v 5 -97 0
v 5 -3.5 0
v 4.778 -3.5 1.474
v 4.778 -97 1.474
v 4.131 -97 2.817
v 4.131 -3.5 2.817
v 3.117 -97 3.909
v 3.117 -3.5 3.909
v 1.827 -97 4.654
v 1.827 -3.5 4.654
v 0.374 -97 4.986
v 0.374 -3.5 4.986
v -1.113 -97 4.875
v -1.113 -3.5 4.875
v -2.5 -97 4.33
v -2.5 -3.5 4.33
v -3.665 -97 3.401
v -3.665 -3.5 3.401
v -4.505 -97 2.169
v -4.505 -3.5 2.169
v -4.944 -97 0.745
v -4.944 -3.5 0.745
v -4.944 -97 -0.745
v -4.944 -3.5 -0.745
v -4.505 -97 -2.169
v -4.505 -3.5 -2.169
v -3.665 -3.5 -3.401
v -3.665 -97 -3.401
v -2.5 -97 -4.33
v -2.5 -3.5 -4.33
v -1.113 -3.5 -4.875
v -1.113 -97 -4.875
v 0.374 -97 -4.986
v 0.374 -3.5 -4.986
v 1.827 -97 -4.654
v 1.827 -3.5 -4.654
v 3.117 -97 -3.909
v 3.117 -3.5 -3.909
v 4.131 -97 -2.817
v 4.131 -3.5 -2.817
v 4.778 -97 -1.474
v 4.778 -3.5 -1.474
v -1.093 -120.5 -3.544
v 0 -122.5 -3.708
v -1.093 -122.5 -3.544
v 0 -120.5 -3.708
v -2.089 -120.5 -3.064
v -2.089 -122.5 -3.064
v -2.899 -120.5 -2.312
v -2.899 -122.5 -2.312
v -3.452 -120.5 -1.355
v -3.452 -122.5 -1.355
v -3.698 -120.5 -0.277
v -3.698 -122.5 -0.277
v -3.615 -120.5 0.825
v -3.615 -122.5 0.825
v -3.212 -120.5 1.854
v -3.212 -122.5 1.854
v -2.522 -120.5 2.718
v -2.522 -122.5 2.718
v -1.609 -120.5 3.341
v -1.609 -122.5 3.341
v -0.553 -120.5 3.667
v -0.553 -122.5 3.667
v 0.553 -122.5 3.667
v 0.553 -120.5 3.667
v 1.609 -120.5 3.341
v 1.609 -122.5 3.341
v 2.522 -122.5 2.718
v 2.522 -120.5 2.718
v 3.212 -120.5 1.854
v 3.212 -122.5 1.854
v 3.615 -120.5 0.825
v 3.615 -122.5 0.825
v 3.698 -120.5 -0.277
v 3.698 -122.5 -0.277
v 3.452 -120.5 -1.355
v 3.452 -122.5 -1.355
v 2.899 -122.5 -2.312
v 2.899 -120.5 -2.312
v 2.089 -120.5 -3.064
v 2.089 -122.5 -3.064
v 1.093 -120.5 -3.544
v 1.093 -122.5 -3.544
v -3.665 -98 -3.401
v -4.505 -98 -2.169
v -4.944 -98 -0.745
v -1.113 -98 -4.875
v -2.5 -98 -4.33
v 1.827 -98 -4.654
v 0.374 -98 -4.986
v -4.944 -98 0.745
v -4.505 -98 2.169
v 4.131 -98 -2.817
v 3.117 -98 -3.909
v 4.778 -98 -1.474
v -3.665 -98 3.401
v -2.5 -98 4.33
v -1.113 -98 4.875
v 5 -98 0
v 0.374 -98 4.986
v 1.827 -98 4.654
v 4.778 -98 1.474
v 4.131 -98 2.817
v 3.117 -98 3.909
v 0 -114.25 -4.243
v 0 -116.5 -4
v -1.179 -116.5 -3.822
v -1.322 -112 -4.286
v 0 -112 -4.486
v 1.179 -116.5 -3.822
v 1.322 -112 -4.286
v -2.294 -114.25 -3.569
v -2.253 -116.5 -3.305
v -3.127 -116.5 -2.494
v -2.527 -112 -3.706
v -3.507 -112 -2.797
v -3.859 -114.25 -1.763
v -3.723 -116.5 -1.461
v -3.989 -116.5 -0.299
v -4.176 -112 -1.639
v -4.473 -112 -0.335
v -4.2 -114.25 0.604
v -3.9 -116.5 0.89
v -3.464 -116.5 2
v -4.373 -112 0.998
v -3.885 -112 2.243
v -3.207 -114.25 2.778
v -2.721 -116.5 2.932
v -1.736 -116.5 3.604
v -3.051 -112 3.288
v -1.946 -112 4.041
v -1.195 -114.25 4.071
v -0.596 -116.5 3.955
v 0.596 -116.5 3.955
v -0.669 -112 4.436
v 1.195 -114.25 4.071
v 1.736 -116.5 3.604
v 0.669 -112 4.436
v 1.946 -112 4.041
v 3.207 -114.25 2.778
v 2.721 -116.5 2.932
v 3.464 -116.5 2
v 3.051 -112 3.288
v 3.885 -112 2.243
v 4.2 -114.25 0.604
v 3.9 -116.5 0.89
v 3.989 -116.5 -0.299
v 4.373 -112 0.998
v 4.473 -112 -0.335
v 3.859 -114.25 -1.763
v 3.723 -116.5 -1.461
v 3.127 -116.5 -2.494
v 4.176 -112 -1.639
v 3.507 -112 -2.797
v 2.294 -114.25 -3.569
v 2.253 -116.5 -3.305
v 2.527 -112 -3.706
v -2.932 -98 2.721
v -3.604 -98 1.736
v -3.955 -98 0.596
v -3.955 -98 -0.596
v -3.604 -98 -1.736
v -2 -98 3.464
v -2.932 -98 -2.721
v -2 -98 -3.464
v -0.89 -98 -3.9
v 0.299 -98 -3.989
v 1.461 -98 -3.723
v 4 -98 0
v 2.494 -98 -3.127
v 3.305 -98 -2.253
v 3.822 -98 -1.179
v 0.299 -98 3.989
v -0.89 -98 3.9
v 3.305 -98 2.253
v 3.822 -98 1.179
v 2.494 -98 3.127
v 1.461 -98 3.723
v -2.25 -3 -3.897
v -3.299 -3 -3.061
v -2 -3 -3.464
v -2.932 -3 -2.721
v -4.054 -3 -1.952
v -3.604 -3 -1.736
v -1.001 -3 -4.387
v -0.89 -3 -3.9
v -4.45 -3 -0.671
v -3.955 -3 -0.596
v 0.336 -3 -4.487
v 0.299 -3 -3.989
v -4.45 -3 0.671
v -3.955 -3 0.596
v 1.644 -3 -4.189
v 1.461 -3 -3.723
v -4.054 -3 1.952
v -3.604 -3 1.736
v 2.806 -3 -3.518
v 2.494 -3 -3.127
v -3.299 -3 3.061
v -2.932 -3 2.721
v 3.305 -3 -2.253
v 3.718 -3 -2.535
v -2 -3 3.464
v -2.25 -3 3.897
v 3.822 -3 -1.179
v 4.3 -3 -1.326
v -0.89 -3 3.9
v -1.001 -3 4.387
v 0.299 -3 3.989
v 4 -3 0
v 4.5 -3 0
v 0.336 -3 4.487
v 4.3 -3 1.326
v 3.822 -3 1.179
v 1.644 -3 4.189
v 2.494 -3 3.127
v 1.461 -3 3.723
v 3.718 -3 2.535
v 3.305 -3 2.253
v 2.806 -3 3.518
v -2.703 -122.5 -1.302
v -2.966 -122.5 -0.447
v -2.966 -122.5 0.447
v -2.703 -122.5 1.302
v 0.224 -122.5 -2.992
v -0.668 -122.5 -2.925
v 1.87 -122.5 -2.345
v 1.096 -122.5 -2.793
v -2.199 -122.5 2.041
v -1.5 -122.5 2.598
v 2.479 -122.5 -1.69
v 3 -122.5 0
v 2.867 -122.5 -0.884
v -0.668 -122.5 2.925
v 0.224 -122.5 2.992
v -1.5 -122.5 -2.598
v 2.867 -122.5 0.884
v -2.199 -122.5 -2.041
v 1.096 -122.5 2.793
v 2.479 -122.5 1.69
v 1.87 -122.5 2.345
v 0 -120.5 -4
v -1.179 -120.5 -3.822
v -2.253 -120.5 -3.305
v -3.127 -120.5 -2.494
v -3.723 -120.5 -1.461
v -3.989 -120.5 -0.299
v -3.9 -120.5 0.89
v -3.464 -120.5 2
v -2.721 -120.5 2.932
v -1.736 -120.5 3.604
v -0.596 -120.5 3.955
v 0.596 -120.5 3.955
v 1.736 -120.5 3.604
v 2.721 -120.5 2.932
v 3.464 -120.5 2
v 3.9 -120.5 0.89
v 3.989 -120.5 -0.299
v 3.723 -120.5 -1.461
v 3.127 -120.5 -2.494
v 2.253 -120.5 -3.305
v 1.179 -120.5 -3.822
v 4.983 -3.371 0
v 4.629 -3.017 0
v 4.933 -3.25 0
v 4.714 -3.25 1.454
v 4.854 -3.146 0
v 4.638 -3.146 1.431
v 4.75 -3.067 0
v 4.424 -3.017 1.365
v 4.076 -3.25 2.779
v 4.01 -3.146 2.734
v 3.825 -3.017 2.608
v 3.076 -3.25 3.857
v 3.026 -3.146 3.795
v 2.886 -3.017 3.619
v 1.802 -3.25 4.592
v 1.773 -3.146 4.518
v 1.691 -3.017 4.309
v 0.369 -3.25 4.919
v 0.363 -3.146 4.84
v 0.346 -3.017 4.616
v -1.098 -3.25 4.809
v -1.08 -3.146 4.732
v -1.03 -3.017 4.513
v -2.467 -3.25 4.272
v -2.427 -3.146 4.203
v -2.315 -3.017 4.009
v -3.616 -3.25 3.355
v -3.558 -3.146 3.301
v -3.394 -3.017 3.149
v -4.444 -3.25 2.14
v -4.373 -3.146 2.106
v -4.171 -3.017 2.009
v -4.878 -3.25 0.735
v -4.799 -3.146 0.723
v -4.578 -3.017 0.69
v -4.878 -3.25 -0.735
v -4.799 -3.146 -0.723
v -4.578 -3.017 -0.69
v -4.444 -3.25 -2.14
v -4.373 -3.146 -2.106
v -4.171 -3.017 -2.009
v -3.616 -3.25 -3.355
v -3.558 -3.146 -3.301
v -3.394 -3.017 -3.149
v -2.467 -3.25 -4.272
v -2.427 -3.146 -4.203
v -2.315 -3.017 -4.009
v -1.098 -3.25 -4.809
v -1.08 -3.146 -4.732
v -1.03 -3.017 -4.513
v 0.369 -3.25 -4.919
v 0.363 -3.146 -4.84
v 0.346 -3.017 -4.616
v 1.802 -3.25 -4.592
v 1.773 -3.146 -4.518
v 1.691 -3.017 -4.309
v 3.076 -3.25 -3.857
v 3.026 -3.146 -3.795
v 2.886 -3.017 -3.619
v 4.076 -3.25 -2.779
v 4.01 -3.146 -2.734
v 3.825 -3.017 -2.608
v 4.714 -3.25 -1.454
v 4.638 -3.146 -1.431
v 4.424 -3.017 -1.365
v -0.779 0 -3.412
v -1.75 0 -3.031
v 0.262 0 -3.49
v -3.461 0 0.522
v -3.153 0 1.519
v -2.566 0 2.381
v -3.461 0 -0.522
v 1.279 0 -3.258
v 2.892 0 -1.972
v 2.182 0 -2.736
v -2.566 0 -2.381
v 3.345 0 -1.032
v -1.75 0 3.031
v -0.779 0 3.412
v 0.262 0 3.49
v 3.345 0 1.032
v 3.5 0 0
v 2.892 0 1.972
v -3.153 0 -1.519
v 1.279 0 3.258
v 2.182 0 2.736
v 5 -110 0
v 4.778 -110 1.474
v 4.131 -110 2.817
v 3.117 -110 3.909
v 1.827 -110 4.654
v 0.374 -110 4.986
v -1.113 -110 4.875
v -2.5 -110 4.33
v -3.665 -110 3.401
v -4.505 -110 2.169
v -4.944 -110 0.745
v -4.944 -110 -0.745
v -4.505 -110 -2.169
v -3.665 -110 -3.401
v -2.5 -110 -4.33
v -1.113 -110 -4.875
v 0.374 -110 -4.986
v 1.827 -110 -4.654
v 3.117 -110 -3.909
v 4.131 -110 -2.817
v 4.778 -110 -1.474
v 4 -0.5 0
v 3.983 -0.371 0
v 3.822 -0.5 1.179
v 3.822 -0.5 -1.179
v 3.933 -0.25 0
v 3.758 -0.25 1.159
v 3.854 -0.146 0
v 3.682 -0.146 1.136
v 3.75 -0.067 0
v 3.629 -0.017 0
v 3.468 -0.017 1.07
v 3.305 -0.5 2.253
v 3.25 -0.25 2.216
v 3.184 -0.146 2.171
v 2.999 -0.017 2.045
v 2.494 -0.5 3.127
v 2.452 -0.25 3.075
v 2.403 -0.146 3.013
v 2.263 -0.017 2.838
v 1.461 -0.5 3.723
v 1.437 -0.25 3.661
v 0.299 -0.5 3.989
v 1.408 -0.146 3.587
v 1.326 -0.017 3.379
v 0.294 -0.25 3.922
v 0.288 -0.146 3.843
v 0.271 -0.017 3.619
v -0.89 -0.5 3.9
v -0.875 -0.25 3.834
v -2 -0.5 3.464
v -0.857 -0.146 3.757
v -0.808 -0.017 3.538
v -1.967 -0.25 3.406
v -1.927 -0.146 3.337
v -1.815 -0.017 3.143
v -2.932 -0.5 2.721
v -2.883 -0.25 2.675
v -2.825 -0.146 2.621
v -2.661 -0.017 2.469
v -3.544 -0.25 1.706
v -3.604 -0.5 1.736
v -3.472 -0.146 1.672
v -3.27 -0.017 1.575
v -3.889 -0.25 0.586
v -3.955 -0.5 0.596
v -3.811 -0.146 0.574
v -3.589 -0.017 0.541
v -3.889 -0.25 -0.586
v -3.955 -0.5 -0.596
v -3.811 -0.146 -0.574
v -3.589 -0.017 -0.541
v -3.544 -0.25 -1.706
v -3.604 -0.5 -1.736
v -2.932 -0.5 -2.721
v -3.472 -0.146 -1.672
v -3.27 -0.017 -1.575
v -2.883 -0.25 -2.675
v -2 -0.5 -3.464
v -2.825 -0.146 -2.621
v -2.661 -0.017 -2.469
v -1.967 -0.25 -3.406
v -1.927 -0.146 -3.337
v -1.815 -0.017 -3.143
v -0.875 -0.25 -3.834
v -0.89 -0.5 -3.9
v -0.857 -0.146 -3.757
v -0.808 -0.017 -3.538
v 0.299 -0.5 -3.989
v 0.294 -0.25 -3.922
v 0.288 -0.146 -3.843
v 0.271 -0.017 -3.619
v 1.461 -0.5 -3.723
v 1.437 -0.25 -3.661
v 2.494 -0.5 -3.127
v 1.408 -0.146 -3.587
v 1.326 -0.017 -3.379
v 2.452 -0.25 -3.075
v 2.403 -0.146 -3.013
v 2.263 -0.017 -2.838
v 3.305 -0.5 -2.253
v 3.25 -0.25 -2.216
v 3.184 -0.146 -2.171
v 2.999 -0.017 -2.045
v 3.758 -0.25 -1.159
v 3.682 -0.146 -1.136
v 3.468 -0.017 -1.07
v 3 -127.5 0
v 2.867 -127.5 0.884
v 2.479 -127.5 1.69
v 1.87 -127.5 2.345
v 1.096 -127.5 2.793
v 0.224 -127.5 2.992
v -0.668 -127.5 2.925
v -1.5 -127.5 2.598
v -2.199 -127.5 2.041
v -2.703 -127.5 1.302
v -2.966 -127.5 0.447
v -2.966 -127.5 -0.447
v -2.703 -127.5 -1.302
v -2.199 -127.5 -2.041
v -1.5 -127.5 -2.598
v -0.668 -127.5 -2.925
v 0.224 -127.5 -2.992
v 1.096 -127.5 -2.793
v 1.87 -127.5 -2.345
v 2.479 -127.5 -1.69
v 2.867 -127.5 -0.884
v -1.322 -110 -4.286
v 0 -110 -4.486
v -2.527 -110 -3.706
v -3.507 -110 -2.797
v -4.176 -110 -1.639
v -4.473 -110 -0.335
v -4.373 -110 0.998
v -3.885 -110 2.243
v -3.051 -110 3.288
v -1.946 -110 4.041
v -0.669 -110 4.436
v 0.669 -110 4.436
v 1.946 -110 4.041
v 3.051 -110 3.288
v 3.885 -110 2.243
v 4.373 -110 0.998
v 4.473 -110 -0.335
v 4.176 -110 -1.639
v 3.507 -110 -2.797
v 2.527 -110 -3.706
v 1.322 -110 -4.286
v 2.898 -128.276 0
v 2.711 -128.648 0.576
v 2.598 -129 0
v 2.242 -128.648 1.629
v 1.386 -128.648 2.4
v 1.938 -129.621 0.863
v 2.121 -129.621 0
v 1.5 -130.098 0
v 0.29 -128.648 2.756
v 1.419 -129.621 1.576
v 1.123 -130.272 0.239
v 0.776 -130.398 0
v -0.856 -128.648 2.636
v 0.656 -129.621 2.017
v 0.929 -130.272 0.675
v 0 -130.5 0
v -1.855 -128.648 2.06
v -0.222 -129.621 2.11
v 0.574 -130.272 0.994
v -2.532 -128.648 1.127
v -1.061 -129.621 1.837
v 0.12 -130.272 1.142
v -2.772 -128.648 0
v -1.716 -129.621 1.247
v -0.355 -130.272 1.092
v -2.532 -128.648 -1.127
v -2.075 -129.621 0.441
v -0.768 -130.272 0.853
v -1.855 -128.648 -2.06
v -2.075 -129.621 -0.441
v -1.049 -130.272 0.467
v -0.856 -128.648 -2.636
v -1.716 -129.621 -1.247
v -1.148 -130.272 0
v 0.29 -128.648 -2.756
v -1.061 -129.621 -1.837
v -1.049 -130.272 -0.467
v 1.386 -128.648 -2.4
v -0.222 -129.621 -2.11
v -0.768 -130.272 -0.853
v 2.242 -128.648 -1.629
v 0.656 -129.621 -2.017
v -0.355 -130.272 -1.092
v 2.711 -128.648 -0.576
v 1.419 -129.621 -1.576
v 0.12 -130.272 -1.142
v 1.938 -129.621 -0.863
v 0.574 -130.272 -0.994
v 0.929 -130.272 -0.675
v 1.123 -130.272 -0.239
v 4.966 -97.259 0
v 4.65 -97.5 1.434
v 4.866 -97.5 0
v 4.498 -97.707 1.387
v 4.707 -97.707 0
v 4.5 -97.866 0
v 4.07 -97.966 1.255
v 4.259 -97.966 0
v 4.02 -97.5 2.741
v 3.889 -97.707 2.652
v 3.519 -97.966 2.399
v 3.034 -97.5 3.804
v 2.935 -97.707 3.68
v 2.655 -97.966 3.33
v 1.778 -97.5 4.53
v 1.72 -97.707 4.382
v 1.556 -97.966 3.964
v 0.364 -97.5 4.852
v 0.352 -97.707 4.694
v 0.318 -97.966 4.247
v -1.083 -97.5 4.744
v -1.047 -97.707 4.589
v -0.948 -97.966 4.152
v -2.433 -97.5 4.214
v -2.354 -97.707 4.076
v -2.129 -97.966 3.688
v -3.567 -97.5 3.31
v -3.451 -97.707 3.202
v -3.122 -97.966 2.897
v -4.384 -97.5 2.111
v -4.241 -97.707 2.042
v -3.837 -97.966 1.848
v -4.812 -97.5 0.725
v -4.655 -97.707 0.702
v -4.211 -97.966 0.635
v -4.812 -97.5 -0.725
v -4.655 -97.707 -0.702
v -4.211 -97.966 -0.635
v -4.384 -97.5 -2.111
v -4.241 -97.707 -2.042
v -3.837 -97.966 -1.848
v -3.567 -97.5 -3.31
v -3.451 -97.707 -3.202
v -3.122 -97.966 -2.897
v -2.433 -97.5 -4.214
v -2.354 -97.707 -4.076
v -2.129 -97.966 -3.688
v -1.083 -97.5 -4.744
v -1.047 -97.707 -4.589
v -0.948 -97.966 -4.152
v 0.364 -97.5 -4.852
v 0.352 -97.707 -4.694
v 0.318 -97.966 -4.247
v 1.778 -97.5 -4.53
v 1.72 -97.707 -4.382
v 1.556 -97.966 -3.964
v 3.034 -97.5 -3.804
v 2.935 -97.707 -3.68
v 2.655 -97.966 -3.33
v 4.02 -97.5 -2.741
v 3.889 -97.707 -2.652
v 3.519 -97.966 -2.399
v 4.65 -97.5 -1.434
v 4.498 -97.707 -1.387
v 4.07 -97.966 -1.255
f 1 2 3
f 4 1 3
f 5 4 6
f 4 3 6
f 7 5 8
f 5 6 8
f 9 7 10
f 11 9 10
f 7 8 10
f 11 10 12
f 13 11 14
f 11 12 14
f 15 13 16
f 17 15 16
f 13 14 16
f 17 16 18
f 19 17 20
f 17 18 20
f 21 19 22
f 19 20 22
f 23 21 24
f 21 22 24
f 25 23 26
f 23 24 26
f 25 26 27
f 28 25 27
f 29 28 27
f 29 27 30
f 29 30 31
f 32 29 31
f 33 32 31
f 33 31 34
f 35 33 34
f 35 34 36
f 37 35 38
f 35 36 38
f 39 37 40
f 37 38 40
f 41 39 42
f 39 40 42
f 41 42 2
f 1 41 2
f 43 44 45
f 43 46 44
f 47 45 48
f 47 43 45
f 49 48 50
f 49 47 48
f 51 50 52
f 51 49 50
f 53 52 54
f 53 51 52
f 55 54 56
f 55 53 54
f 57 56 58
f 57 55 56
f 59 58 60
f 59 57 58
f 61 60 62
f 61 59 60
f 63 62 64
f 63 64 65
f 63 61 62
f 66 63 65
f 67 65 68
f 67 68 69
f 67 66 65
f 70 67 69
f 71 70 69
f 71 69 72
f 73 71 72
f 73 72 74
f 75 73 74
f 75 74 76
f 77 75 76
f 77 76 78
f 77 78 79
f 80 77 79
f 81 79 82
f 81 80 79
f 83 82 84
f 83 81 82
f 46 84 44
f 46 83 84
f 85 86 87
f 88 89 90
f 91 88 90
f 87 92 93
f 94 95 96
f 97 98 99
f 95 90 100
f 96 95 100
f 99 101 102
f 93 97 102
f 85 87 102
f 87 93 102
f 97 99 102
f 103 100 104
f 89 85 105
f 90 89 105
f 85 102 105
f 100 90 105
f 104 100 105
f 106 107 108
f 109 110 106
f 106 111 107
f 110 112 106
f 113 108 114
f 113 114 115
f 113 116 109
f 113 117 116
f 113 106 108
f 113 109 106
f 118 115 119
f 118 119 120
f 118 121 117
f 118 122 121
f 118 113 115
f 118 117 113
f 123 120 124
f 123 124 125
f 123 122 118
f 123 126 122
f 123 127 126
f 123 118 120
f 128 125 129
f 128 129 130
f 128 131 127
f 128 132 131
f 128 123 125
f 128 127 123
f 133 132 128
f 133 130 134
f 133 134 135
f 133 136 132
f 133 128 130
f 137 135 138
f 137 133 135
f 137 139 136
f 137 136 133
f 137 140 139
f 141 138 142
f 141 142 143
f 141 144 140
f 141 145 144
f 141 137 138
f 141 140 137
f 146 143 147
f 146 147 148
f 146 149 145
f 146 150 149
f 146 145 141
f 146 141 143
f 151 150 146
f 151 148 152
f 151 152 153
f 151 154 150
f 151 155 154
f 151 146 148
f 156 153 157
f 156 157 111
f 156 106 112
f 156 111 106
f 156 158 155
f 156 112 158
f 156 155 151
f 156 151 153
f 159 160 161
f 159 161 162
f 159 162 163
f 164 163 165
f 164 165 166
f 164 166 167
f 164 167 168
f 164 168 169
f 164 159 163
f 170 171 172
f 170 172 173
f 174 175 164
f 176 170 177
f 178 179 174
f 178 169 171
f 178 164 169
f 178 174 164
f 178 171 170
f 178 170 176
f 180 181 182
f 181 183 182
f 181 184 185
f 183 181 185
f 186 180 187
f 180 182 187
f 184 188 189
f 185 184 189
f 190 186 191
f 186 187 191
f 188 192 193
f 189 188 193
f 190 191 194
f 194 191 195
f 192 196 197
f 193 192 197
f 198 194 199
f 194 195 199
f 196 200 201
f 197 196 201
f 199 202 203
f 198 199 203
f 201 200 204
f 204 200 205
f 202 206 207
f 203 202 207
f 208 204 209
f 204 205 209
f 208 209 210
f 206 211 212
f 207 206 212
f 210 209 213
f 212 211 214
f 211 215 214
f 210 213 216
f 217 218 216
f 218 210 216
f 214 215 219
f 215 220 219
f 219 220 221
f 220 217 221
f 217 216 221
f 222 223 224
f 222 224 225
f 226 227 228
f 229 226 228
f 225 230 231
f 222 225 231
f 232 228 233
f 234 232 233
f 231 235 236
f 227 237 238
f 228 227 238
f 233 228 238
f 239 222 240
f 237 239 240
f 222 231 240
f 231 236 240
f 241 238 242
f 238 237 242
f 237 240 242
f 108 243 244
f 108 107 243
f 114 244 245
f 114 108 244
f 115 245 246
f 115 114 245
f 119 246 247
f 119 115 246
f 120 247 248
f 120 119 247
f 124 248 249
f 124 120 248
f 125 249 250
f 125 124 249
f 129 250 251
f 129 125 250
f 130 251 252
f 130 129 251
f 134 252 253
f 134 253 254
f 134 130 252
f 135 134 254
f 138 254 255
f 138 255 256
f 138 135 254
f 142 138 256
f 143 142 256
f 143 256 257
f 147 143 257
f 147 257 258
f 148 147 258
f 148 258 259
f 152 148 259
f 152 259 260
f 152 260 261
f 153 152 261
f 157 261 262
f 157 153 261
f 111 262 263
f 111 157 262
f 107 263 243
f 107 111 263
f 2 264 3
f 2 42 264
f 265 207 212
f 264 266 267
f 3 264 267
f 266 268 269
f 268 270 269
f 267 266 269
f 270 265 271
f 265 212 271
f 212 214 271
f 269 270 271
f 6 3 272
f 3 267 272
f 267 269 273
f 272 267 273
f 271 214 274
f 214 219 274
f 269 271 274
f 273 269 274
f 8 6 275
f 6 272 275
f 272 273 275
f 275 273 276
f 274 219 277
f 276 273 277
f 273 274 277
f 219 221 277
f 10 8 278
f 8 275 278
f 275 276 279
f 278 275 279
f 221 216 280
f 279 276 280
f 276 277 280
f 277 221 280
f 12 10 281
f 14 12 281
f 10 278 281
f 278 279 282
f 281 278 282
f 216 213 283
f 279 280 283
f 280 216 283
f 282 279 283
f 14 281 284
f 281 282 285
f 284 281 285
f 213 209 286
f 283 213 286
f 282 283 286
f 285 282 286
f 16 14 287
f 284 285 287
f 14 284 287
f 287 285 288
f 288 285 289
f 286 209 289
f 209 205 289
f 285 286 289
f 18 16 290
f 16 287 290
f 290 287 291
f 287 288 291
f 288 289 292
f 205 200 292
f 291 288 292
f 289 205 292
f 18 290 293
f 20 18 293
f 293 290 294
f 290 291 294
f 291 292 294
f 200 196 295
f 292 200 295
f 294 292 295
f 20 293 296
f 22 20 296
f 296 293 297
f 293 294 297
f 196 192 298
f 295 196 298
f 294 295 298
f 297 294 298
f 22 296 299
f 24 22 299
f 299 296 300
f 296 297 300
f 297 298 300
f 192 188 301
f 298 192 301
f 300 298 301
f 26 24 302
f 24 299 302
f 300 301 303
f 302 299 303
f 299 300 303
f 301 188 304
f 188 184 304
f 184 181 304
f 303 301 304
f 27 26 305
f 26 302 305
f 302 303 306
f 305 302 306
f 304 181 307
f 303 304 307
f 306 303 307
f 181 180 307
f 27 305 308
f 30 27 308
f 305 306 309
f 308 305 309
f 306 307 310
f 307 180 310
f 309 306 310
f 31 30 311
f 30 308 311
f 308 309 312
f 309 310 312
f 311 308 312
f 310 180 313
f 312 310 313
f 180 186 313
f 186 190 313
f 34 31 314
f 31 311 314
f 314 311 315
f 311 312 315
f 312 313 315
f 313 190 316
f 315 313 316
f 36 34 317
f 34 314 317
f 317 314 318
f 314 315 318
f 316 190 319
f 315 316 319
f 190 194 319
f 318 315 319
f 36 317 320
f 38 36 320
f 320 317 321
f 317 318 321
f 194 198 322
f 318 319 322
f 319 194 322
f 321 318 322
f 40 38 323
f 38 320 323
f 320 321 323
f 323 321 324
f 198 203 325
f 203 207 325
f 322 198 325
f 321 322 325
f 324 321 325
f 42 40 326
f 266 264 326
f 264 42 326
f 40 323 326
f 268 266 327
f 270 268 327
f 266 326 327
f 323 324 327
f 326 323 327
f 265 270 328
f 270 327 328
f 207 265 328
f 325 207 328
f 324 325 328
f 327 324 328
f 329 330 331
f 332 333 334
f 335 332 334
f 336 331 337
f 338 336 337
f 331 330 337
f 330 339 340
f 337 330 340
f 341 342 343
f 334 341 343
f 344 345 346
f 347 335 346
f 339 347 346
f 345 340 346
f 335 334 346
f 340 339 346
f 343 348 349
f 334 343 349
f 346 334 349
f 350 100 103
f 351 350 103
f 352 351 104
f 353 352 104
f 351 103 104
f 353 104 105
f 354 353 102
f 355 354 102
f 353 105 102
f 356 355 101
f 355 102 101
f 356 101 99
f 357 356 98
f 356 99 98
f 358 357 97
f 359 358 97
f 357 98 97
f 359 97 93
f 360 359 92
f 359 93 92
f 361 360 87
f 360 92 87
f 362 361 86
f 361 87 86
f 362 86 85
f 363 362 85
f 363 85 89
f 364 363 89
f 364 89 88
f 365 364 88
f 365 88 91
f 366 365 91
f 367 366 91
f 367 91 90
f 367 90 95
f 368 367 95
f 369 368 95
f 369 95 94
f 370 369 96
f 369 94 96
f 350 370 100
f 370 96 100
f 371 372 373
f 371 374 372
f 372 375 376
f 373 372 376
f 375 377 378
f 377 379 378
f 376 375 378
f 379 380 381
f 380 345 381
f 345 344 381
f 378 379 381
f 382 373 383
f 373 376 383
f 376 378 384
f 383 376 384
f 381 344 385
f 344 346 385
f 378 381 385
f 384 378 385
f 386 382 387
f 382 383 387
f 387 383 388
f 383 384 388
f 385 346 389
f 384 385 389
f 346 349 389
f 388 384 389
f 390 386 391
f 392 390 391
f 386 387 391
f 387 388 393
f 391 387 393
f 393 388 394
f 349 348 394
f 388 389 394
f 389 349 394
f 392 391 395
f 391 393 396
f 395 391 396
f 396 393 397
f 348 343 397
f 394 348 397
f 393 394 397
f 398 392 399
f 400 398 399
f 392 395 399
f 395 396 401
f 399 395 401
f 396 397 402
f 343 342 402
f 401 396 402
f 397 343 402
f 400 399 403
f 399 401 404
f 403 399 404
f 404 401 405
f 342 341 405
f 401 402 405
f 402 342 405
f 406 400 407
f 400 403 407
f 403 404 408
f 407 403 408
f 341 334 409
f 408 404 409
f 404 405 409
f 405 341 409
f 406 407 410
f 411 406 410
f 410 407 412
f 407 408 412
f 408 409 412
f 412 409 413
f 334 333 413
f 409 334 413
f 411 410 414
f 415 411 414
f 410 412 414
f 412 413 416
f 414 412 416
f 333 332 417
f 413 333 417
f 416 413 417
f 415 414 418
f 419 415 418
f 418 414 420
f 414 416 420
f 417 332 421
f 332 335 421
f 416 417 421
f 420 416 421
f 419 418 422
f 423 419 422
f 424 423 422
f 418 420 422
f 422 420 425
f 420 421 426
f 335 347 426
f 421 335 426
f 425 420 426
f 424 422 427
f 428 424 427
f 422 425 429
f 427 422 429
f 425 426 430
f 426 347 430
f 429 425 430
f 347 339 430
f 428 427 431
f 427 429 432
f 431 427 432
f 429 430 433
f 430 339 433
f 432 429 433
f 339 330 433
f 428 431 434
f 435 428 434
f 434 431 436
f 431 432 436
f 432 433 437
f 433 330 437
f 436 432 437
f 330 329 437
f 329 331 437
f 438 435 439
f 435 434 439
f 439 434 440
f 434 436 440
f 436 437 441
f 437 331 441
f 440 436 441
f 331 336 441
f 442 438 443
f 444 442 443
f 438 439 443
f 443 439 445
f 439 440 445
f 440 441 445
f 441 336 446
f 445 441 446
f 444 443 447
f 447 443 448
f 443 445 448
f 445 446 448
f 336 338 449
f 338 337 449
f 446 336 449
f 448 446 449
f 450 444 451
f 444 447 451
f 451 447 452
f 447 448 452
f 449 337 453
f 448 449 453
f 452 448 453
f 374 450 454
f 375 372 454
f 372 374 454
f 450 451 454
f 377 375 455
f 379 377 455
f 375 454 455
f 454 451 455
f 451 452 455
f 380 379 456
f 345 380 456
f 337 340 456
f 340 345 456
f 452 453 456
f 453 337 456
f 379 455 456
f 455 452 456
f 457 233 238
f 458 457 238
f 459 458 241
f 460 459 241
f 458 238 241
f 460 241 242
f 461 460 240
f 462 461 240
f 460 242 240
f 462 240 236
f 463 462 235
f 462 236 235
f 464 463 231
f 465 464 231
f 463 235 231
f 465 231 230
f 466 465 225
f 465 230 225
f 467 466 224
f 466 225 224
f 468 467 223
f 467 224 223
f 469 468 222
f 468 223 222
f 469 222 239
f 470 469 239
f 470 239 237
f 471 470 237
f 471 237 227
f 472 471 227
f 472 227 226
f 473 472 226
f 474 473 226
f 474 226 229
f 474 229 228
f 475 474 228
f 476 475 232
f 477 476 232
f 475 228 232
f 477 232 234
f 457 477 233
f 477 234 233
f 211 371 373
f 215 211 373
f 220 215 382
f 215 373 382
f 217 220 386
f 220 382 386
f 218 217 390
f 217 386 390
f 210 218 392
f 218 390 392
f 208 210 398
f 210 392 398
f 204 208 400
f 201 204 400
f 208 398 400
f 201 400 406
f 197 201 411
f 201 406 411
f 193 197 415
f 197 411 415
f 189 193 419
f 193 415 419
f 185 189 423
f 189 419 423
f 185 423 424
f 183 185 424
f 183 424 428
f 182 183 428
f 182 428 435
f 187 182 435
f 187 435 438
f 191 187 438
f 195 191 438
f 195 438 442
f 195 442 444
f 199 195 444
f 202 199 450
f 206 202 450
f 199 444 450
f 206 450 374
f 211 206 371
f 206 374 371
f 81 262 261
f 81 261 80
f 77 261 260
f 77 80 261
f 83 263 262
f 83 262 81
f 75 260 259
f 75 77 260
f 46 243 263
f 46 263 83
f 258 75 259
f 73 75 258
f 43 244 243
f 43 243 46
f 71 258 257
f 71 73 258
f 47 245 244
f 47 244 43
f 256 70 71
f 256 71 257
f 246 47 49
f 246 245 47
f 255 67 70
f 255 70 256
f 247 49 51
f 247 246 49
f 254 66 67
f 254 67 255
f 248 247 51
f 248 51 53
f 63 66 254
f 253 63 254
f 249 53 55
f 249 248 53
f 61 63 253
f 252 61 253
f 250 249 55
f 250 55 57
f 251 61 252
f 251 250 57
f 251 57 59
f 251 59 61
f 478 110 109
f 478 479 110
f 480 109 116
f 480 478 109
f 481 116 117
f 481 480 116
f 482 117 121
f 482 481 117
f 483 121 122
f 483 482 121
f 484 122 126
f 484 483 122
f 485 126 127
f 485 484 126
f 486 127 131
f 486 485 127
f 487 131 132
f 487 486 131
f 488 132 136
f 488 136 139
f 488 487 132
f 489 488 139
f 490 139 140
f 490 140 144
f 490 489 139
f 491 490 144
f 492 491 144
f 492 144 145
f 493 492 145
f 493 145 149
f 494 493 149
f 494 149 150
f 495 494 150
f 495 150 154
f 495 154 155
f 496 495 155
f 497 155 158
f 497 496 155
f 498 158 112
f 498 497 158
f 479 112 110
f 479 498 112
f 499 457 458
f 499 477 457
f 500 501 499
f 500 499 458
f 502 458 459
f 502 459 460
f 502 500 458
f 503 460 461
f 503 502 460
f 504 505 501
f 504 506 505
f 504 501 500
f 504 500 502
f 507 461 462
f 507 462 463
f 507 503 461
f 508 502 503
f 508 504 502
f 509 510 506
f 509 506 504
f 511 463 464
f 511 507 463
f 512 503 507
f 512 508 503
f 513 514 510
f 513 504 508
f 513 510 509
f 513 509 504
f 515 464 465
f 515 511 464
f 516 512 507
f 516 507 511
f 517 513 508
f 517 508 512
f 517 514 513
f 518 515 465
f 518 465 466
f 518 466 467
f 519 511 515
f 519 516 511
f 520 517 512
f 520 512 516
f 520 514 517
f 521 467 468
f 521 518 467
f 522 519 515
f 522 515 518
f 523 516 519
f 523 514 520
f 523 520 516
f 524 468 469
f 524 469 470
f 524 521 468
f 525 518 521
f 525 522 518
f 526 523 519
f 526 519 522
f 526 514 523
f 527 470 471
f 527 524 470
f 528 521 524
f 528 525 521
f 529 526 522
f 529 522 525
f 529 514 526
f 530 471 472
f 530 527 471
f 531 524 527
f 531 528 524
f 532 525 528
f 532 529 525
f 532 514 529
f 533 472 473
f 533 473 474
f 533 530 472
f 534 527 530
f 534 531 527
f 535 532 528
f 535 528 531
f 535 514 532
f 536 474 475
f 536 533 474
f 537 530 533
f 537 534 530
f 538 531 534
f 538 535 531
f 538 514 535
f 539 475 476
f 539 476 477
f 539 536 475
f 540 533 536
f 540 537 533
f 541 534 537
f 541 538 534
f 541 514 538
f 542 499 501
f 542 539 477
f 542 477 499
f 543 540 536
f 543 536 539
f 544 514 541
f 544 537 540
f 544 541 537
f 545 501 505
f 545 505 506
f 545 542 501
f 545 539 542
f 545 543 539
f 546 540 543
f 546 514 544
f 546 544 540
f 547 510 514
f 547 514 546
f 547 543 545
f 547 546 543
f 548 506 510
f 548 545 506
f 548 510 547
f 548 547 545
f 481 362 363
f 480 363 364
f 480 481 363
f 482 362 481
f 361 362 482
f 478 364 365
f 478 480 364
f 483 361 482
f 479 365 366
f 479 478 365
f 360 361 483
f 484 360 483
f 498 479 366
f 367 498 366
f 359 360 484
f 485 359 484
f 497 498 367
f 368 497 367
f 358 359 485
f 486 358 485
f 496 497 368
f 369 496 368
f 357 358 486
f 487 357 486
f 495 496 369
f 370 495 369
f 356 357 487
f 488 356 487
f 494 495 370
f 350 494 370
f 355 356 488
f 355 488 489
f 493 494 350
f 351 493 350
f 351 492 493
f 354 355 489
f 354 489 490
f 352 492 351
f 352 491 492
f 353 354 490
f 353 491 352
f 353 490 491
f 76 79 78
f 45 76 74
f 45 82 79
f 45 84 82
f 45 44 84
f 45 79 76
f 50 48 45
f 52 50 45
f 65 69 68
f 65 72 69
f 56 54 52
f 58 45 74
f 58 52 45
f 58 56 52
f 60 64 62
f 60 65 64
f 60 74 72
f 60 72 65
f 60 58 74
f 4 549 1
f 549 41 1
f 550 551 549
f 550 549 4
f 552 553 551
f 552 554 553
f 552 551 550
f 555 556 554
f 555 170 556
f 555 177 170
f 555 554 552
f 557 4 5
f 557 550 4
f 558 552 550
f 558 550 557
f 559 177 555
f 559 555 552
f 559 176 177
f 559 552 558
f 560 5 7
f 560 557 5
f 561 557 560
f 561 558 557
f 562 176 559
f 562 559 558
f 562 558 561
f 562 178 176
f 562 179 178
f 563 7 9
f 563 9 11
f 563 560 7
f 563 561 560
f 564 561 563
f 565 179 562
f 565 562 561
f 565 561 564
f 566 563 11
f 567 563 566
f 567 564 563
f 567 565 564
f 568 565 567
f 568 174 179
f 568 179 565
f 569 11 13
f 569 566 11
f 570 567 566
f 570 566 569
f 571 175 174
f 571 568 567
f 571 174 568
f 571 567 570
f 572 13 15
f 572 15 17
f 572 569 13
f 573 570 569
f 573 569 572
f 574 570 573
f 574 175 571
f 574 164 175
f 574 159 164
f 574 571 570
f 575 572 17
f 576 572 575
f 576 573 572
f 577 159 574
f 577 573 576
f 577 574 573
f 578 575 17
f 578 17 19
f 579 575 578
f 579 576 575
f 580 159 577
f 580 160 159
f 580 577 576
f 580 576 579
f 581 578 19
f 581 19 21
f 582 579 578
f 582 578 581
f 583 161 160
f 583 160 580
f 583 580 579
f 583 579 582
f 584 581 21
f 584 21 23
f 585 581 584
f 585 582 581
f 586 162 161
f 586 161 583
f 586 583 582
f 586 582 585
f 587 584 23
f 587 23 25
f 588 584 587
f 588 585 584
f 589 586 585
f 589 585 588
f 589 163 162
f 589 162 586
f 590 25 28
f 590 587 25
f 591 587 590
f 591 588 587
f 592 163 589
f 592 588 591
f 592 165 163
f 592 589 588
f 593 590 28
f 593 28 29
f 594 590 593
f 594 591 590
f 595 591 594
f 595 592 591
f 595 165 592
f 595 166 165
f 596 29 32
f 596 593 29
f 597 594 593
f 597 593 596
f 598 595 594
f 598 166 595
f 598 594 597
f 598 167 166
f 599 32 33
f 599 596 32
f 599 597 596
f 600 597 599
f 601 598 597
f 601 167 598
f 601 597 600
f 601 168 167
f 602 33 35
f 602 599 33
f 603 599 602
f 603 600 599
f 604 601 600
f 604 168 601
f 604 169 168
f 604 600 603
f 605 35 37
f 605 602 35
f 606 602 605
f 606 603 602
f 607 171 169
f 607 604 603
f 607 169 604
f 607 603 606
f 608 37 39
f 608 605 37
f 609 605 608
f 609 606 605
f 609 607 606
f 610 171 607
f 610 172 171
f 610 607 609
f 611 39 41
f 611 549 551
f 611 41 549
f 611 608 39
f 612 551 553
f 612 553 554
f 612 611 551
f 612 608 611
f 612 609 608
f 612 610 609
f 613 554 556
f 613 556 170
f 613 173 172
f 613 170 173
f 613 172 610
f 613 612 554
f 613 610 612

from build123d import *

# Parameters (mm, degrees)
F0_R      = 4
F1_DEPTH  = 3
F2_R      = 5
F3_DEPTH  = 95
F4_R      = 1
F5_R      = 5
F6_DEPTH  = 12
F9_R      = 3
F10_DEPTH = 8
F11_R     = 3
F12_R     = 0.5


with BuildPart() as f1:
    # F0 (on Front) → F1 (new body)
    with BuildSketch(Plane.XZ):
        Circle(F0_R)
    extrude(amount=F1_DEPTH)

    # F2 (on face) → F3 (join)
    with BuildSketch(Plane.XZ.offset(3)):
        Circle(F2_R)
    extrude(amount=F3_DEPTH)

    # F4
    f4_edges = [f1.edges().sort_by_distance(p)[0] for p in [
        (-5, -98, 0),
    ]]
    fillet(f4_edges, radius=F4_R)

    # F12
    f12_edges = [f1.edges().sort_by_distance(p)[0] for p in [
        (-5, -3, 0),
        (-4, 0, 0),
    ]]
    fillet(f12_edges, radius=F12_R)


with BuildPart() as f6:
    # F5 (on face) → F6 (new body)
    with BuildSketch(Plane.XZ.offset(98)):
        Circle(F5_R)
    extrude(amount=F6_DEPTH)

    # F7 (on Right) → F8 (revolve)
    with BuildSketch(Plane.YZ):
        Polygon((-112, -4.485713318), (-110, -4.485713318), (-110, 0), (-122.5, 0), (-122.5, -3.7083302159), (-120.5, -3.7083302159), (-120.5, -4), (-116.5, -4), align=None)
    revolve(axis=Axis((0, -116.25, 0), (0, 1, 0)))


with BuildPart() as f10:
    # F9 (on face) → F10 (new body)
    with BuildSketch(Plane.XZ.offset(122.5)):
        Circle(F9_R)
    extrude(amount=F10_DEPTH)

    # F11
    f11_edges = [f10.edges().sort_by_distance(p)[0] for p in [
        (-3, -130.5, 0),
    ]]
    fillet(f11_edges, radius=F11_R)


solid = Compound([f1.part, f6.part, f10.part])
